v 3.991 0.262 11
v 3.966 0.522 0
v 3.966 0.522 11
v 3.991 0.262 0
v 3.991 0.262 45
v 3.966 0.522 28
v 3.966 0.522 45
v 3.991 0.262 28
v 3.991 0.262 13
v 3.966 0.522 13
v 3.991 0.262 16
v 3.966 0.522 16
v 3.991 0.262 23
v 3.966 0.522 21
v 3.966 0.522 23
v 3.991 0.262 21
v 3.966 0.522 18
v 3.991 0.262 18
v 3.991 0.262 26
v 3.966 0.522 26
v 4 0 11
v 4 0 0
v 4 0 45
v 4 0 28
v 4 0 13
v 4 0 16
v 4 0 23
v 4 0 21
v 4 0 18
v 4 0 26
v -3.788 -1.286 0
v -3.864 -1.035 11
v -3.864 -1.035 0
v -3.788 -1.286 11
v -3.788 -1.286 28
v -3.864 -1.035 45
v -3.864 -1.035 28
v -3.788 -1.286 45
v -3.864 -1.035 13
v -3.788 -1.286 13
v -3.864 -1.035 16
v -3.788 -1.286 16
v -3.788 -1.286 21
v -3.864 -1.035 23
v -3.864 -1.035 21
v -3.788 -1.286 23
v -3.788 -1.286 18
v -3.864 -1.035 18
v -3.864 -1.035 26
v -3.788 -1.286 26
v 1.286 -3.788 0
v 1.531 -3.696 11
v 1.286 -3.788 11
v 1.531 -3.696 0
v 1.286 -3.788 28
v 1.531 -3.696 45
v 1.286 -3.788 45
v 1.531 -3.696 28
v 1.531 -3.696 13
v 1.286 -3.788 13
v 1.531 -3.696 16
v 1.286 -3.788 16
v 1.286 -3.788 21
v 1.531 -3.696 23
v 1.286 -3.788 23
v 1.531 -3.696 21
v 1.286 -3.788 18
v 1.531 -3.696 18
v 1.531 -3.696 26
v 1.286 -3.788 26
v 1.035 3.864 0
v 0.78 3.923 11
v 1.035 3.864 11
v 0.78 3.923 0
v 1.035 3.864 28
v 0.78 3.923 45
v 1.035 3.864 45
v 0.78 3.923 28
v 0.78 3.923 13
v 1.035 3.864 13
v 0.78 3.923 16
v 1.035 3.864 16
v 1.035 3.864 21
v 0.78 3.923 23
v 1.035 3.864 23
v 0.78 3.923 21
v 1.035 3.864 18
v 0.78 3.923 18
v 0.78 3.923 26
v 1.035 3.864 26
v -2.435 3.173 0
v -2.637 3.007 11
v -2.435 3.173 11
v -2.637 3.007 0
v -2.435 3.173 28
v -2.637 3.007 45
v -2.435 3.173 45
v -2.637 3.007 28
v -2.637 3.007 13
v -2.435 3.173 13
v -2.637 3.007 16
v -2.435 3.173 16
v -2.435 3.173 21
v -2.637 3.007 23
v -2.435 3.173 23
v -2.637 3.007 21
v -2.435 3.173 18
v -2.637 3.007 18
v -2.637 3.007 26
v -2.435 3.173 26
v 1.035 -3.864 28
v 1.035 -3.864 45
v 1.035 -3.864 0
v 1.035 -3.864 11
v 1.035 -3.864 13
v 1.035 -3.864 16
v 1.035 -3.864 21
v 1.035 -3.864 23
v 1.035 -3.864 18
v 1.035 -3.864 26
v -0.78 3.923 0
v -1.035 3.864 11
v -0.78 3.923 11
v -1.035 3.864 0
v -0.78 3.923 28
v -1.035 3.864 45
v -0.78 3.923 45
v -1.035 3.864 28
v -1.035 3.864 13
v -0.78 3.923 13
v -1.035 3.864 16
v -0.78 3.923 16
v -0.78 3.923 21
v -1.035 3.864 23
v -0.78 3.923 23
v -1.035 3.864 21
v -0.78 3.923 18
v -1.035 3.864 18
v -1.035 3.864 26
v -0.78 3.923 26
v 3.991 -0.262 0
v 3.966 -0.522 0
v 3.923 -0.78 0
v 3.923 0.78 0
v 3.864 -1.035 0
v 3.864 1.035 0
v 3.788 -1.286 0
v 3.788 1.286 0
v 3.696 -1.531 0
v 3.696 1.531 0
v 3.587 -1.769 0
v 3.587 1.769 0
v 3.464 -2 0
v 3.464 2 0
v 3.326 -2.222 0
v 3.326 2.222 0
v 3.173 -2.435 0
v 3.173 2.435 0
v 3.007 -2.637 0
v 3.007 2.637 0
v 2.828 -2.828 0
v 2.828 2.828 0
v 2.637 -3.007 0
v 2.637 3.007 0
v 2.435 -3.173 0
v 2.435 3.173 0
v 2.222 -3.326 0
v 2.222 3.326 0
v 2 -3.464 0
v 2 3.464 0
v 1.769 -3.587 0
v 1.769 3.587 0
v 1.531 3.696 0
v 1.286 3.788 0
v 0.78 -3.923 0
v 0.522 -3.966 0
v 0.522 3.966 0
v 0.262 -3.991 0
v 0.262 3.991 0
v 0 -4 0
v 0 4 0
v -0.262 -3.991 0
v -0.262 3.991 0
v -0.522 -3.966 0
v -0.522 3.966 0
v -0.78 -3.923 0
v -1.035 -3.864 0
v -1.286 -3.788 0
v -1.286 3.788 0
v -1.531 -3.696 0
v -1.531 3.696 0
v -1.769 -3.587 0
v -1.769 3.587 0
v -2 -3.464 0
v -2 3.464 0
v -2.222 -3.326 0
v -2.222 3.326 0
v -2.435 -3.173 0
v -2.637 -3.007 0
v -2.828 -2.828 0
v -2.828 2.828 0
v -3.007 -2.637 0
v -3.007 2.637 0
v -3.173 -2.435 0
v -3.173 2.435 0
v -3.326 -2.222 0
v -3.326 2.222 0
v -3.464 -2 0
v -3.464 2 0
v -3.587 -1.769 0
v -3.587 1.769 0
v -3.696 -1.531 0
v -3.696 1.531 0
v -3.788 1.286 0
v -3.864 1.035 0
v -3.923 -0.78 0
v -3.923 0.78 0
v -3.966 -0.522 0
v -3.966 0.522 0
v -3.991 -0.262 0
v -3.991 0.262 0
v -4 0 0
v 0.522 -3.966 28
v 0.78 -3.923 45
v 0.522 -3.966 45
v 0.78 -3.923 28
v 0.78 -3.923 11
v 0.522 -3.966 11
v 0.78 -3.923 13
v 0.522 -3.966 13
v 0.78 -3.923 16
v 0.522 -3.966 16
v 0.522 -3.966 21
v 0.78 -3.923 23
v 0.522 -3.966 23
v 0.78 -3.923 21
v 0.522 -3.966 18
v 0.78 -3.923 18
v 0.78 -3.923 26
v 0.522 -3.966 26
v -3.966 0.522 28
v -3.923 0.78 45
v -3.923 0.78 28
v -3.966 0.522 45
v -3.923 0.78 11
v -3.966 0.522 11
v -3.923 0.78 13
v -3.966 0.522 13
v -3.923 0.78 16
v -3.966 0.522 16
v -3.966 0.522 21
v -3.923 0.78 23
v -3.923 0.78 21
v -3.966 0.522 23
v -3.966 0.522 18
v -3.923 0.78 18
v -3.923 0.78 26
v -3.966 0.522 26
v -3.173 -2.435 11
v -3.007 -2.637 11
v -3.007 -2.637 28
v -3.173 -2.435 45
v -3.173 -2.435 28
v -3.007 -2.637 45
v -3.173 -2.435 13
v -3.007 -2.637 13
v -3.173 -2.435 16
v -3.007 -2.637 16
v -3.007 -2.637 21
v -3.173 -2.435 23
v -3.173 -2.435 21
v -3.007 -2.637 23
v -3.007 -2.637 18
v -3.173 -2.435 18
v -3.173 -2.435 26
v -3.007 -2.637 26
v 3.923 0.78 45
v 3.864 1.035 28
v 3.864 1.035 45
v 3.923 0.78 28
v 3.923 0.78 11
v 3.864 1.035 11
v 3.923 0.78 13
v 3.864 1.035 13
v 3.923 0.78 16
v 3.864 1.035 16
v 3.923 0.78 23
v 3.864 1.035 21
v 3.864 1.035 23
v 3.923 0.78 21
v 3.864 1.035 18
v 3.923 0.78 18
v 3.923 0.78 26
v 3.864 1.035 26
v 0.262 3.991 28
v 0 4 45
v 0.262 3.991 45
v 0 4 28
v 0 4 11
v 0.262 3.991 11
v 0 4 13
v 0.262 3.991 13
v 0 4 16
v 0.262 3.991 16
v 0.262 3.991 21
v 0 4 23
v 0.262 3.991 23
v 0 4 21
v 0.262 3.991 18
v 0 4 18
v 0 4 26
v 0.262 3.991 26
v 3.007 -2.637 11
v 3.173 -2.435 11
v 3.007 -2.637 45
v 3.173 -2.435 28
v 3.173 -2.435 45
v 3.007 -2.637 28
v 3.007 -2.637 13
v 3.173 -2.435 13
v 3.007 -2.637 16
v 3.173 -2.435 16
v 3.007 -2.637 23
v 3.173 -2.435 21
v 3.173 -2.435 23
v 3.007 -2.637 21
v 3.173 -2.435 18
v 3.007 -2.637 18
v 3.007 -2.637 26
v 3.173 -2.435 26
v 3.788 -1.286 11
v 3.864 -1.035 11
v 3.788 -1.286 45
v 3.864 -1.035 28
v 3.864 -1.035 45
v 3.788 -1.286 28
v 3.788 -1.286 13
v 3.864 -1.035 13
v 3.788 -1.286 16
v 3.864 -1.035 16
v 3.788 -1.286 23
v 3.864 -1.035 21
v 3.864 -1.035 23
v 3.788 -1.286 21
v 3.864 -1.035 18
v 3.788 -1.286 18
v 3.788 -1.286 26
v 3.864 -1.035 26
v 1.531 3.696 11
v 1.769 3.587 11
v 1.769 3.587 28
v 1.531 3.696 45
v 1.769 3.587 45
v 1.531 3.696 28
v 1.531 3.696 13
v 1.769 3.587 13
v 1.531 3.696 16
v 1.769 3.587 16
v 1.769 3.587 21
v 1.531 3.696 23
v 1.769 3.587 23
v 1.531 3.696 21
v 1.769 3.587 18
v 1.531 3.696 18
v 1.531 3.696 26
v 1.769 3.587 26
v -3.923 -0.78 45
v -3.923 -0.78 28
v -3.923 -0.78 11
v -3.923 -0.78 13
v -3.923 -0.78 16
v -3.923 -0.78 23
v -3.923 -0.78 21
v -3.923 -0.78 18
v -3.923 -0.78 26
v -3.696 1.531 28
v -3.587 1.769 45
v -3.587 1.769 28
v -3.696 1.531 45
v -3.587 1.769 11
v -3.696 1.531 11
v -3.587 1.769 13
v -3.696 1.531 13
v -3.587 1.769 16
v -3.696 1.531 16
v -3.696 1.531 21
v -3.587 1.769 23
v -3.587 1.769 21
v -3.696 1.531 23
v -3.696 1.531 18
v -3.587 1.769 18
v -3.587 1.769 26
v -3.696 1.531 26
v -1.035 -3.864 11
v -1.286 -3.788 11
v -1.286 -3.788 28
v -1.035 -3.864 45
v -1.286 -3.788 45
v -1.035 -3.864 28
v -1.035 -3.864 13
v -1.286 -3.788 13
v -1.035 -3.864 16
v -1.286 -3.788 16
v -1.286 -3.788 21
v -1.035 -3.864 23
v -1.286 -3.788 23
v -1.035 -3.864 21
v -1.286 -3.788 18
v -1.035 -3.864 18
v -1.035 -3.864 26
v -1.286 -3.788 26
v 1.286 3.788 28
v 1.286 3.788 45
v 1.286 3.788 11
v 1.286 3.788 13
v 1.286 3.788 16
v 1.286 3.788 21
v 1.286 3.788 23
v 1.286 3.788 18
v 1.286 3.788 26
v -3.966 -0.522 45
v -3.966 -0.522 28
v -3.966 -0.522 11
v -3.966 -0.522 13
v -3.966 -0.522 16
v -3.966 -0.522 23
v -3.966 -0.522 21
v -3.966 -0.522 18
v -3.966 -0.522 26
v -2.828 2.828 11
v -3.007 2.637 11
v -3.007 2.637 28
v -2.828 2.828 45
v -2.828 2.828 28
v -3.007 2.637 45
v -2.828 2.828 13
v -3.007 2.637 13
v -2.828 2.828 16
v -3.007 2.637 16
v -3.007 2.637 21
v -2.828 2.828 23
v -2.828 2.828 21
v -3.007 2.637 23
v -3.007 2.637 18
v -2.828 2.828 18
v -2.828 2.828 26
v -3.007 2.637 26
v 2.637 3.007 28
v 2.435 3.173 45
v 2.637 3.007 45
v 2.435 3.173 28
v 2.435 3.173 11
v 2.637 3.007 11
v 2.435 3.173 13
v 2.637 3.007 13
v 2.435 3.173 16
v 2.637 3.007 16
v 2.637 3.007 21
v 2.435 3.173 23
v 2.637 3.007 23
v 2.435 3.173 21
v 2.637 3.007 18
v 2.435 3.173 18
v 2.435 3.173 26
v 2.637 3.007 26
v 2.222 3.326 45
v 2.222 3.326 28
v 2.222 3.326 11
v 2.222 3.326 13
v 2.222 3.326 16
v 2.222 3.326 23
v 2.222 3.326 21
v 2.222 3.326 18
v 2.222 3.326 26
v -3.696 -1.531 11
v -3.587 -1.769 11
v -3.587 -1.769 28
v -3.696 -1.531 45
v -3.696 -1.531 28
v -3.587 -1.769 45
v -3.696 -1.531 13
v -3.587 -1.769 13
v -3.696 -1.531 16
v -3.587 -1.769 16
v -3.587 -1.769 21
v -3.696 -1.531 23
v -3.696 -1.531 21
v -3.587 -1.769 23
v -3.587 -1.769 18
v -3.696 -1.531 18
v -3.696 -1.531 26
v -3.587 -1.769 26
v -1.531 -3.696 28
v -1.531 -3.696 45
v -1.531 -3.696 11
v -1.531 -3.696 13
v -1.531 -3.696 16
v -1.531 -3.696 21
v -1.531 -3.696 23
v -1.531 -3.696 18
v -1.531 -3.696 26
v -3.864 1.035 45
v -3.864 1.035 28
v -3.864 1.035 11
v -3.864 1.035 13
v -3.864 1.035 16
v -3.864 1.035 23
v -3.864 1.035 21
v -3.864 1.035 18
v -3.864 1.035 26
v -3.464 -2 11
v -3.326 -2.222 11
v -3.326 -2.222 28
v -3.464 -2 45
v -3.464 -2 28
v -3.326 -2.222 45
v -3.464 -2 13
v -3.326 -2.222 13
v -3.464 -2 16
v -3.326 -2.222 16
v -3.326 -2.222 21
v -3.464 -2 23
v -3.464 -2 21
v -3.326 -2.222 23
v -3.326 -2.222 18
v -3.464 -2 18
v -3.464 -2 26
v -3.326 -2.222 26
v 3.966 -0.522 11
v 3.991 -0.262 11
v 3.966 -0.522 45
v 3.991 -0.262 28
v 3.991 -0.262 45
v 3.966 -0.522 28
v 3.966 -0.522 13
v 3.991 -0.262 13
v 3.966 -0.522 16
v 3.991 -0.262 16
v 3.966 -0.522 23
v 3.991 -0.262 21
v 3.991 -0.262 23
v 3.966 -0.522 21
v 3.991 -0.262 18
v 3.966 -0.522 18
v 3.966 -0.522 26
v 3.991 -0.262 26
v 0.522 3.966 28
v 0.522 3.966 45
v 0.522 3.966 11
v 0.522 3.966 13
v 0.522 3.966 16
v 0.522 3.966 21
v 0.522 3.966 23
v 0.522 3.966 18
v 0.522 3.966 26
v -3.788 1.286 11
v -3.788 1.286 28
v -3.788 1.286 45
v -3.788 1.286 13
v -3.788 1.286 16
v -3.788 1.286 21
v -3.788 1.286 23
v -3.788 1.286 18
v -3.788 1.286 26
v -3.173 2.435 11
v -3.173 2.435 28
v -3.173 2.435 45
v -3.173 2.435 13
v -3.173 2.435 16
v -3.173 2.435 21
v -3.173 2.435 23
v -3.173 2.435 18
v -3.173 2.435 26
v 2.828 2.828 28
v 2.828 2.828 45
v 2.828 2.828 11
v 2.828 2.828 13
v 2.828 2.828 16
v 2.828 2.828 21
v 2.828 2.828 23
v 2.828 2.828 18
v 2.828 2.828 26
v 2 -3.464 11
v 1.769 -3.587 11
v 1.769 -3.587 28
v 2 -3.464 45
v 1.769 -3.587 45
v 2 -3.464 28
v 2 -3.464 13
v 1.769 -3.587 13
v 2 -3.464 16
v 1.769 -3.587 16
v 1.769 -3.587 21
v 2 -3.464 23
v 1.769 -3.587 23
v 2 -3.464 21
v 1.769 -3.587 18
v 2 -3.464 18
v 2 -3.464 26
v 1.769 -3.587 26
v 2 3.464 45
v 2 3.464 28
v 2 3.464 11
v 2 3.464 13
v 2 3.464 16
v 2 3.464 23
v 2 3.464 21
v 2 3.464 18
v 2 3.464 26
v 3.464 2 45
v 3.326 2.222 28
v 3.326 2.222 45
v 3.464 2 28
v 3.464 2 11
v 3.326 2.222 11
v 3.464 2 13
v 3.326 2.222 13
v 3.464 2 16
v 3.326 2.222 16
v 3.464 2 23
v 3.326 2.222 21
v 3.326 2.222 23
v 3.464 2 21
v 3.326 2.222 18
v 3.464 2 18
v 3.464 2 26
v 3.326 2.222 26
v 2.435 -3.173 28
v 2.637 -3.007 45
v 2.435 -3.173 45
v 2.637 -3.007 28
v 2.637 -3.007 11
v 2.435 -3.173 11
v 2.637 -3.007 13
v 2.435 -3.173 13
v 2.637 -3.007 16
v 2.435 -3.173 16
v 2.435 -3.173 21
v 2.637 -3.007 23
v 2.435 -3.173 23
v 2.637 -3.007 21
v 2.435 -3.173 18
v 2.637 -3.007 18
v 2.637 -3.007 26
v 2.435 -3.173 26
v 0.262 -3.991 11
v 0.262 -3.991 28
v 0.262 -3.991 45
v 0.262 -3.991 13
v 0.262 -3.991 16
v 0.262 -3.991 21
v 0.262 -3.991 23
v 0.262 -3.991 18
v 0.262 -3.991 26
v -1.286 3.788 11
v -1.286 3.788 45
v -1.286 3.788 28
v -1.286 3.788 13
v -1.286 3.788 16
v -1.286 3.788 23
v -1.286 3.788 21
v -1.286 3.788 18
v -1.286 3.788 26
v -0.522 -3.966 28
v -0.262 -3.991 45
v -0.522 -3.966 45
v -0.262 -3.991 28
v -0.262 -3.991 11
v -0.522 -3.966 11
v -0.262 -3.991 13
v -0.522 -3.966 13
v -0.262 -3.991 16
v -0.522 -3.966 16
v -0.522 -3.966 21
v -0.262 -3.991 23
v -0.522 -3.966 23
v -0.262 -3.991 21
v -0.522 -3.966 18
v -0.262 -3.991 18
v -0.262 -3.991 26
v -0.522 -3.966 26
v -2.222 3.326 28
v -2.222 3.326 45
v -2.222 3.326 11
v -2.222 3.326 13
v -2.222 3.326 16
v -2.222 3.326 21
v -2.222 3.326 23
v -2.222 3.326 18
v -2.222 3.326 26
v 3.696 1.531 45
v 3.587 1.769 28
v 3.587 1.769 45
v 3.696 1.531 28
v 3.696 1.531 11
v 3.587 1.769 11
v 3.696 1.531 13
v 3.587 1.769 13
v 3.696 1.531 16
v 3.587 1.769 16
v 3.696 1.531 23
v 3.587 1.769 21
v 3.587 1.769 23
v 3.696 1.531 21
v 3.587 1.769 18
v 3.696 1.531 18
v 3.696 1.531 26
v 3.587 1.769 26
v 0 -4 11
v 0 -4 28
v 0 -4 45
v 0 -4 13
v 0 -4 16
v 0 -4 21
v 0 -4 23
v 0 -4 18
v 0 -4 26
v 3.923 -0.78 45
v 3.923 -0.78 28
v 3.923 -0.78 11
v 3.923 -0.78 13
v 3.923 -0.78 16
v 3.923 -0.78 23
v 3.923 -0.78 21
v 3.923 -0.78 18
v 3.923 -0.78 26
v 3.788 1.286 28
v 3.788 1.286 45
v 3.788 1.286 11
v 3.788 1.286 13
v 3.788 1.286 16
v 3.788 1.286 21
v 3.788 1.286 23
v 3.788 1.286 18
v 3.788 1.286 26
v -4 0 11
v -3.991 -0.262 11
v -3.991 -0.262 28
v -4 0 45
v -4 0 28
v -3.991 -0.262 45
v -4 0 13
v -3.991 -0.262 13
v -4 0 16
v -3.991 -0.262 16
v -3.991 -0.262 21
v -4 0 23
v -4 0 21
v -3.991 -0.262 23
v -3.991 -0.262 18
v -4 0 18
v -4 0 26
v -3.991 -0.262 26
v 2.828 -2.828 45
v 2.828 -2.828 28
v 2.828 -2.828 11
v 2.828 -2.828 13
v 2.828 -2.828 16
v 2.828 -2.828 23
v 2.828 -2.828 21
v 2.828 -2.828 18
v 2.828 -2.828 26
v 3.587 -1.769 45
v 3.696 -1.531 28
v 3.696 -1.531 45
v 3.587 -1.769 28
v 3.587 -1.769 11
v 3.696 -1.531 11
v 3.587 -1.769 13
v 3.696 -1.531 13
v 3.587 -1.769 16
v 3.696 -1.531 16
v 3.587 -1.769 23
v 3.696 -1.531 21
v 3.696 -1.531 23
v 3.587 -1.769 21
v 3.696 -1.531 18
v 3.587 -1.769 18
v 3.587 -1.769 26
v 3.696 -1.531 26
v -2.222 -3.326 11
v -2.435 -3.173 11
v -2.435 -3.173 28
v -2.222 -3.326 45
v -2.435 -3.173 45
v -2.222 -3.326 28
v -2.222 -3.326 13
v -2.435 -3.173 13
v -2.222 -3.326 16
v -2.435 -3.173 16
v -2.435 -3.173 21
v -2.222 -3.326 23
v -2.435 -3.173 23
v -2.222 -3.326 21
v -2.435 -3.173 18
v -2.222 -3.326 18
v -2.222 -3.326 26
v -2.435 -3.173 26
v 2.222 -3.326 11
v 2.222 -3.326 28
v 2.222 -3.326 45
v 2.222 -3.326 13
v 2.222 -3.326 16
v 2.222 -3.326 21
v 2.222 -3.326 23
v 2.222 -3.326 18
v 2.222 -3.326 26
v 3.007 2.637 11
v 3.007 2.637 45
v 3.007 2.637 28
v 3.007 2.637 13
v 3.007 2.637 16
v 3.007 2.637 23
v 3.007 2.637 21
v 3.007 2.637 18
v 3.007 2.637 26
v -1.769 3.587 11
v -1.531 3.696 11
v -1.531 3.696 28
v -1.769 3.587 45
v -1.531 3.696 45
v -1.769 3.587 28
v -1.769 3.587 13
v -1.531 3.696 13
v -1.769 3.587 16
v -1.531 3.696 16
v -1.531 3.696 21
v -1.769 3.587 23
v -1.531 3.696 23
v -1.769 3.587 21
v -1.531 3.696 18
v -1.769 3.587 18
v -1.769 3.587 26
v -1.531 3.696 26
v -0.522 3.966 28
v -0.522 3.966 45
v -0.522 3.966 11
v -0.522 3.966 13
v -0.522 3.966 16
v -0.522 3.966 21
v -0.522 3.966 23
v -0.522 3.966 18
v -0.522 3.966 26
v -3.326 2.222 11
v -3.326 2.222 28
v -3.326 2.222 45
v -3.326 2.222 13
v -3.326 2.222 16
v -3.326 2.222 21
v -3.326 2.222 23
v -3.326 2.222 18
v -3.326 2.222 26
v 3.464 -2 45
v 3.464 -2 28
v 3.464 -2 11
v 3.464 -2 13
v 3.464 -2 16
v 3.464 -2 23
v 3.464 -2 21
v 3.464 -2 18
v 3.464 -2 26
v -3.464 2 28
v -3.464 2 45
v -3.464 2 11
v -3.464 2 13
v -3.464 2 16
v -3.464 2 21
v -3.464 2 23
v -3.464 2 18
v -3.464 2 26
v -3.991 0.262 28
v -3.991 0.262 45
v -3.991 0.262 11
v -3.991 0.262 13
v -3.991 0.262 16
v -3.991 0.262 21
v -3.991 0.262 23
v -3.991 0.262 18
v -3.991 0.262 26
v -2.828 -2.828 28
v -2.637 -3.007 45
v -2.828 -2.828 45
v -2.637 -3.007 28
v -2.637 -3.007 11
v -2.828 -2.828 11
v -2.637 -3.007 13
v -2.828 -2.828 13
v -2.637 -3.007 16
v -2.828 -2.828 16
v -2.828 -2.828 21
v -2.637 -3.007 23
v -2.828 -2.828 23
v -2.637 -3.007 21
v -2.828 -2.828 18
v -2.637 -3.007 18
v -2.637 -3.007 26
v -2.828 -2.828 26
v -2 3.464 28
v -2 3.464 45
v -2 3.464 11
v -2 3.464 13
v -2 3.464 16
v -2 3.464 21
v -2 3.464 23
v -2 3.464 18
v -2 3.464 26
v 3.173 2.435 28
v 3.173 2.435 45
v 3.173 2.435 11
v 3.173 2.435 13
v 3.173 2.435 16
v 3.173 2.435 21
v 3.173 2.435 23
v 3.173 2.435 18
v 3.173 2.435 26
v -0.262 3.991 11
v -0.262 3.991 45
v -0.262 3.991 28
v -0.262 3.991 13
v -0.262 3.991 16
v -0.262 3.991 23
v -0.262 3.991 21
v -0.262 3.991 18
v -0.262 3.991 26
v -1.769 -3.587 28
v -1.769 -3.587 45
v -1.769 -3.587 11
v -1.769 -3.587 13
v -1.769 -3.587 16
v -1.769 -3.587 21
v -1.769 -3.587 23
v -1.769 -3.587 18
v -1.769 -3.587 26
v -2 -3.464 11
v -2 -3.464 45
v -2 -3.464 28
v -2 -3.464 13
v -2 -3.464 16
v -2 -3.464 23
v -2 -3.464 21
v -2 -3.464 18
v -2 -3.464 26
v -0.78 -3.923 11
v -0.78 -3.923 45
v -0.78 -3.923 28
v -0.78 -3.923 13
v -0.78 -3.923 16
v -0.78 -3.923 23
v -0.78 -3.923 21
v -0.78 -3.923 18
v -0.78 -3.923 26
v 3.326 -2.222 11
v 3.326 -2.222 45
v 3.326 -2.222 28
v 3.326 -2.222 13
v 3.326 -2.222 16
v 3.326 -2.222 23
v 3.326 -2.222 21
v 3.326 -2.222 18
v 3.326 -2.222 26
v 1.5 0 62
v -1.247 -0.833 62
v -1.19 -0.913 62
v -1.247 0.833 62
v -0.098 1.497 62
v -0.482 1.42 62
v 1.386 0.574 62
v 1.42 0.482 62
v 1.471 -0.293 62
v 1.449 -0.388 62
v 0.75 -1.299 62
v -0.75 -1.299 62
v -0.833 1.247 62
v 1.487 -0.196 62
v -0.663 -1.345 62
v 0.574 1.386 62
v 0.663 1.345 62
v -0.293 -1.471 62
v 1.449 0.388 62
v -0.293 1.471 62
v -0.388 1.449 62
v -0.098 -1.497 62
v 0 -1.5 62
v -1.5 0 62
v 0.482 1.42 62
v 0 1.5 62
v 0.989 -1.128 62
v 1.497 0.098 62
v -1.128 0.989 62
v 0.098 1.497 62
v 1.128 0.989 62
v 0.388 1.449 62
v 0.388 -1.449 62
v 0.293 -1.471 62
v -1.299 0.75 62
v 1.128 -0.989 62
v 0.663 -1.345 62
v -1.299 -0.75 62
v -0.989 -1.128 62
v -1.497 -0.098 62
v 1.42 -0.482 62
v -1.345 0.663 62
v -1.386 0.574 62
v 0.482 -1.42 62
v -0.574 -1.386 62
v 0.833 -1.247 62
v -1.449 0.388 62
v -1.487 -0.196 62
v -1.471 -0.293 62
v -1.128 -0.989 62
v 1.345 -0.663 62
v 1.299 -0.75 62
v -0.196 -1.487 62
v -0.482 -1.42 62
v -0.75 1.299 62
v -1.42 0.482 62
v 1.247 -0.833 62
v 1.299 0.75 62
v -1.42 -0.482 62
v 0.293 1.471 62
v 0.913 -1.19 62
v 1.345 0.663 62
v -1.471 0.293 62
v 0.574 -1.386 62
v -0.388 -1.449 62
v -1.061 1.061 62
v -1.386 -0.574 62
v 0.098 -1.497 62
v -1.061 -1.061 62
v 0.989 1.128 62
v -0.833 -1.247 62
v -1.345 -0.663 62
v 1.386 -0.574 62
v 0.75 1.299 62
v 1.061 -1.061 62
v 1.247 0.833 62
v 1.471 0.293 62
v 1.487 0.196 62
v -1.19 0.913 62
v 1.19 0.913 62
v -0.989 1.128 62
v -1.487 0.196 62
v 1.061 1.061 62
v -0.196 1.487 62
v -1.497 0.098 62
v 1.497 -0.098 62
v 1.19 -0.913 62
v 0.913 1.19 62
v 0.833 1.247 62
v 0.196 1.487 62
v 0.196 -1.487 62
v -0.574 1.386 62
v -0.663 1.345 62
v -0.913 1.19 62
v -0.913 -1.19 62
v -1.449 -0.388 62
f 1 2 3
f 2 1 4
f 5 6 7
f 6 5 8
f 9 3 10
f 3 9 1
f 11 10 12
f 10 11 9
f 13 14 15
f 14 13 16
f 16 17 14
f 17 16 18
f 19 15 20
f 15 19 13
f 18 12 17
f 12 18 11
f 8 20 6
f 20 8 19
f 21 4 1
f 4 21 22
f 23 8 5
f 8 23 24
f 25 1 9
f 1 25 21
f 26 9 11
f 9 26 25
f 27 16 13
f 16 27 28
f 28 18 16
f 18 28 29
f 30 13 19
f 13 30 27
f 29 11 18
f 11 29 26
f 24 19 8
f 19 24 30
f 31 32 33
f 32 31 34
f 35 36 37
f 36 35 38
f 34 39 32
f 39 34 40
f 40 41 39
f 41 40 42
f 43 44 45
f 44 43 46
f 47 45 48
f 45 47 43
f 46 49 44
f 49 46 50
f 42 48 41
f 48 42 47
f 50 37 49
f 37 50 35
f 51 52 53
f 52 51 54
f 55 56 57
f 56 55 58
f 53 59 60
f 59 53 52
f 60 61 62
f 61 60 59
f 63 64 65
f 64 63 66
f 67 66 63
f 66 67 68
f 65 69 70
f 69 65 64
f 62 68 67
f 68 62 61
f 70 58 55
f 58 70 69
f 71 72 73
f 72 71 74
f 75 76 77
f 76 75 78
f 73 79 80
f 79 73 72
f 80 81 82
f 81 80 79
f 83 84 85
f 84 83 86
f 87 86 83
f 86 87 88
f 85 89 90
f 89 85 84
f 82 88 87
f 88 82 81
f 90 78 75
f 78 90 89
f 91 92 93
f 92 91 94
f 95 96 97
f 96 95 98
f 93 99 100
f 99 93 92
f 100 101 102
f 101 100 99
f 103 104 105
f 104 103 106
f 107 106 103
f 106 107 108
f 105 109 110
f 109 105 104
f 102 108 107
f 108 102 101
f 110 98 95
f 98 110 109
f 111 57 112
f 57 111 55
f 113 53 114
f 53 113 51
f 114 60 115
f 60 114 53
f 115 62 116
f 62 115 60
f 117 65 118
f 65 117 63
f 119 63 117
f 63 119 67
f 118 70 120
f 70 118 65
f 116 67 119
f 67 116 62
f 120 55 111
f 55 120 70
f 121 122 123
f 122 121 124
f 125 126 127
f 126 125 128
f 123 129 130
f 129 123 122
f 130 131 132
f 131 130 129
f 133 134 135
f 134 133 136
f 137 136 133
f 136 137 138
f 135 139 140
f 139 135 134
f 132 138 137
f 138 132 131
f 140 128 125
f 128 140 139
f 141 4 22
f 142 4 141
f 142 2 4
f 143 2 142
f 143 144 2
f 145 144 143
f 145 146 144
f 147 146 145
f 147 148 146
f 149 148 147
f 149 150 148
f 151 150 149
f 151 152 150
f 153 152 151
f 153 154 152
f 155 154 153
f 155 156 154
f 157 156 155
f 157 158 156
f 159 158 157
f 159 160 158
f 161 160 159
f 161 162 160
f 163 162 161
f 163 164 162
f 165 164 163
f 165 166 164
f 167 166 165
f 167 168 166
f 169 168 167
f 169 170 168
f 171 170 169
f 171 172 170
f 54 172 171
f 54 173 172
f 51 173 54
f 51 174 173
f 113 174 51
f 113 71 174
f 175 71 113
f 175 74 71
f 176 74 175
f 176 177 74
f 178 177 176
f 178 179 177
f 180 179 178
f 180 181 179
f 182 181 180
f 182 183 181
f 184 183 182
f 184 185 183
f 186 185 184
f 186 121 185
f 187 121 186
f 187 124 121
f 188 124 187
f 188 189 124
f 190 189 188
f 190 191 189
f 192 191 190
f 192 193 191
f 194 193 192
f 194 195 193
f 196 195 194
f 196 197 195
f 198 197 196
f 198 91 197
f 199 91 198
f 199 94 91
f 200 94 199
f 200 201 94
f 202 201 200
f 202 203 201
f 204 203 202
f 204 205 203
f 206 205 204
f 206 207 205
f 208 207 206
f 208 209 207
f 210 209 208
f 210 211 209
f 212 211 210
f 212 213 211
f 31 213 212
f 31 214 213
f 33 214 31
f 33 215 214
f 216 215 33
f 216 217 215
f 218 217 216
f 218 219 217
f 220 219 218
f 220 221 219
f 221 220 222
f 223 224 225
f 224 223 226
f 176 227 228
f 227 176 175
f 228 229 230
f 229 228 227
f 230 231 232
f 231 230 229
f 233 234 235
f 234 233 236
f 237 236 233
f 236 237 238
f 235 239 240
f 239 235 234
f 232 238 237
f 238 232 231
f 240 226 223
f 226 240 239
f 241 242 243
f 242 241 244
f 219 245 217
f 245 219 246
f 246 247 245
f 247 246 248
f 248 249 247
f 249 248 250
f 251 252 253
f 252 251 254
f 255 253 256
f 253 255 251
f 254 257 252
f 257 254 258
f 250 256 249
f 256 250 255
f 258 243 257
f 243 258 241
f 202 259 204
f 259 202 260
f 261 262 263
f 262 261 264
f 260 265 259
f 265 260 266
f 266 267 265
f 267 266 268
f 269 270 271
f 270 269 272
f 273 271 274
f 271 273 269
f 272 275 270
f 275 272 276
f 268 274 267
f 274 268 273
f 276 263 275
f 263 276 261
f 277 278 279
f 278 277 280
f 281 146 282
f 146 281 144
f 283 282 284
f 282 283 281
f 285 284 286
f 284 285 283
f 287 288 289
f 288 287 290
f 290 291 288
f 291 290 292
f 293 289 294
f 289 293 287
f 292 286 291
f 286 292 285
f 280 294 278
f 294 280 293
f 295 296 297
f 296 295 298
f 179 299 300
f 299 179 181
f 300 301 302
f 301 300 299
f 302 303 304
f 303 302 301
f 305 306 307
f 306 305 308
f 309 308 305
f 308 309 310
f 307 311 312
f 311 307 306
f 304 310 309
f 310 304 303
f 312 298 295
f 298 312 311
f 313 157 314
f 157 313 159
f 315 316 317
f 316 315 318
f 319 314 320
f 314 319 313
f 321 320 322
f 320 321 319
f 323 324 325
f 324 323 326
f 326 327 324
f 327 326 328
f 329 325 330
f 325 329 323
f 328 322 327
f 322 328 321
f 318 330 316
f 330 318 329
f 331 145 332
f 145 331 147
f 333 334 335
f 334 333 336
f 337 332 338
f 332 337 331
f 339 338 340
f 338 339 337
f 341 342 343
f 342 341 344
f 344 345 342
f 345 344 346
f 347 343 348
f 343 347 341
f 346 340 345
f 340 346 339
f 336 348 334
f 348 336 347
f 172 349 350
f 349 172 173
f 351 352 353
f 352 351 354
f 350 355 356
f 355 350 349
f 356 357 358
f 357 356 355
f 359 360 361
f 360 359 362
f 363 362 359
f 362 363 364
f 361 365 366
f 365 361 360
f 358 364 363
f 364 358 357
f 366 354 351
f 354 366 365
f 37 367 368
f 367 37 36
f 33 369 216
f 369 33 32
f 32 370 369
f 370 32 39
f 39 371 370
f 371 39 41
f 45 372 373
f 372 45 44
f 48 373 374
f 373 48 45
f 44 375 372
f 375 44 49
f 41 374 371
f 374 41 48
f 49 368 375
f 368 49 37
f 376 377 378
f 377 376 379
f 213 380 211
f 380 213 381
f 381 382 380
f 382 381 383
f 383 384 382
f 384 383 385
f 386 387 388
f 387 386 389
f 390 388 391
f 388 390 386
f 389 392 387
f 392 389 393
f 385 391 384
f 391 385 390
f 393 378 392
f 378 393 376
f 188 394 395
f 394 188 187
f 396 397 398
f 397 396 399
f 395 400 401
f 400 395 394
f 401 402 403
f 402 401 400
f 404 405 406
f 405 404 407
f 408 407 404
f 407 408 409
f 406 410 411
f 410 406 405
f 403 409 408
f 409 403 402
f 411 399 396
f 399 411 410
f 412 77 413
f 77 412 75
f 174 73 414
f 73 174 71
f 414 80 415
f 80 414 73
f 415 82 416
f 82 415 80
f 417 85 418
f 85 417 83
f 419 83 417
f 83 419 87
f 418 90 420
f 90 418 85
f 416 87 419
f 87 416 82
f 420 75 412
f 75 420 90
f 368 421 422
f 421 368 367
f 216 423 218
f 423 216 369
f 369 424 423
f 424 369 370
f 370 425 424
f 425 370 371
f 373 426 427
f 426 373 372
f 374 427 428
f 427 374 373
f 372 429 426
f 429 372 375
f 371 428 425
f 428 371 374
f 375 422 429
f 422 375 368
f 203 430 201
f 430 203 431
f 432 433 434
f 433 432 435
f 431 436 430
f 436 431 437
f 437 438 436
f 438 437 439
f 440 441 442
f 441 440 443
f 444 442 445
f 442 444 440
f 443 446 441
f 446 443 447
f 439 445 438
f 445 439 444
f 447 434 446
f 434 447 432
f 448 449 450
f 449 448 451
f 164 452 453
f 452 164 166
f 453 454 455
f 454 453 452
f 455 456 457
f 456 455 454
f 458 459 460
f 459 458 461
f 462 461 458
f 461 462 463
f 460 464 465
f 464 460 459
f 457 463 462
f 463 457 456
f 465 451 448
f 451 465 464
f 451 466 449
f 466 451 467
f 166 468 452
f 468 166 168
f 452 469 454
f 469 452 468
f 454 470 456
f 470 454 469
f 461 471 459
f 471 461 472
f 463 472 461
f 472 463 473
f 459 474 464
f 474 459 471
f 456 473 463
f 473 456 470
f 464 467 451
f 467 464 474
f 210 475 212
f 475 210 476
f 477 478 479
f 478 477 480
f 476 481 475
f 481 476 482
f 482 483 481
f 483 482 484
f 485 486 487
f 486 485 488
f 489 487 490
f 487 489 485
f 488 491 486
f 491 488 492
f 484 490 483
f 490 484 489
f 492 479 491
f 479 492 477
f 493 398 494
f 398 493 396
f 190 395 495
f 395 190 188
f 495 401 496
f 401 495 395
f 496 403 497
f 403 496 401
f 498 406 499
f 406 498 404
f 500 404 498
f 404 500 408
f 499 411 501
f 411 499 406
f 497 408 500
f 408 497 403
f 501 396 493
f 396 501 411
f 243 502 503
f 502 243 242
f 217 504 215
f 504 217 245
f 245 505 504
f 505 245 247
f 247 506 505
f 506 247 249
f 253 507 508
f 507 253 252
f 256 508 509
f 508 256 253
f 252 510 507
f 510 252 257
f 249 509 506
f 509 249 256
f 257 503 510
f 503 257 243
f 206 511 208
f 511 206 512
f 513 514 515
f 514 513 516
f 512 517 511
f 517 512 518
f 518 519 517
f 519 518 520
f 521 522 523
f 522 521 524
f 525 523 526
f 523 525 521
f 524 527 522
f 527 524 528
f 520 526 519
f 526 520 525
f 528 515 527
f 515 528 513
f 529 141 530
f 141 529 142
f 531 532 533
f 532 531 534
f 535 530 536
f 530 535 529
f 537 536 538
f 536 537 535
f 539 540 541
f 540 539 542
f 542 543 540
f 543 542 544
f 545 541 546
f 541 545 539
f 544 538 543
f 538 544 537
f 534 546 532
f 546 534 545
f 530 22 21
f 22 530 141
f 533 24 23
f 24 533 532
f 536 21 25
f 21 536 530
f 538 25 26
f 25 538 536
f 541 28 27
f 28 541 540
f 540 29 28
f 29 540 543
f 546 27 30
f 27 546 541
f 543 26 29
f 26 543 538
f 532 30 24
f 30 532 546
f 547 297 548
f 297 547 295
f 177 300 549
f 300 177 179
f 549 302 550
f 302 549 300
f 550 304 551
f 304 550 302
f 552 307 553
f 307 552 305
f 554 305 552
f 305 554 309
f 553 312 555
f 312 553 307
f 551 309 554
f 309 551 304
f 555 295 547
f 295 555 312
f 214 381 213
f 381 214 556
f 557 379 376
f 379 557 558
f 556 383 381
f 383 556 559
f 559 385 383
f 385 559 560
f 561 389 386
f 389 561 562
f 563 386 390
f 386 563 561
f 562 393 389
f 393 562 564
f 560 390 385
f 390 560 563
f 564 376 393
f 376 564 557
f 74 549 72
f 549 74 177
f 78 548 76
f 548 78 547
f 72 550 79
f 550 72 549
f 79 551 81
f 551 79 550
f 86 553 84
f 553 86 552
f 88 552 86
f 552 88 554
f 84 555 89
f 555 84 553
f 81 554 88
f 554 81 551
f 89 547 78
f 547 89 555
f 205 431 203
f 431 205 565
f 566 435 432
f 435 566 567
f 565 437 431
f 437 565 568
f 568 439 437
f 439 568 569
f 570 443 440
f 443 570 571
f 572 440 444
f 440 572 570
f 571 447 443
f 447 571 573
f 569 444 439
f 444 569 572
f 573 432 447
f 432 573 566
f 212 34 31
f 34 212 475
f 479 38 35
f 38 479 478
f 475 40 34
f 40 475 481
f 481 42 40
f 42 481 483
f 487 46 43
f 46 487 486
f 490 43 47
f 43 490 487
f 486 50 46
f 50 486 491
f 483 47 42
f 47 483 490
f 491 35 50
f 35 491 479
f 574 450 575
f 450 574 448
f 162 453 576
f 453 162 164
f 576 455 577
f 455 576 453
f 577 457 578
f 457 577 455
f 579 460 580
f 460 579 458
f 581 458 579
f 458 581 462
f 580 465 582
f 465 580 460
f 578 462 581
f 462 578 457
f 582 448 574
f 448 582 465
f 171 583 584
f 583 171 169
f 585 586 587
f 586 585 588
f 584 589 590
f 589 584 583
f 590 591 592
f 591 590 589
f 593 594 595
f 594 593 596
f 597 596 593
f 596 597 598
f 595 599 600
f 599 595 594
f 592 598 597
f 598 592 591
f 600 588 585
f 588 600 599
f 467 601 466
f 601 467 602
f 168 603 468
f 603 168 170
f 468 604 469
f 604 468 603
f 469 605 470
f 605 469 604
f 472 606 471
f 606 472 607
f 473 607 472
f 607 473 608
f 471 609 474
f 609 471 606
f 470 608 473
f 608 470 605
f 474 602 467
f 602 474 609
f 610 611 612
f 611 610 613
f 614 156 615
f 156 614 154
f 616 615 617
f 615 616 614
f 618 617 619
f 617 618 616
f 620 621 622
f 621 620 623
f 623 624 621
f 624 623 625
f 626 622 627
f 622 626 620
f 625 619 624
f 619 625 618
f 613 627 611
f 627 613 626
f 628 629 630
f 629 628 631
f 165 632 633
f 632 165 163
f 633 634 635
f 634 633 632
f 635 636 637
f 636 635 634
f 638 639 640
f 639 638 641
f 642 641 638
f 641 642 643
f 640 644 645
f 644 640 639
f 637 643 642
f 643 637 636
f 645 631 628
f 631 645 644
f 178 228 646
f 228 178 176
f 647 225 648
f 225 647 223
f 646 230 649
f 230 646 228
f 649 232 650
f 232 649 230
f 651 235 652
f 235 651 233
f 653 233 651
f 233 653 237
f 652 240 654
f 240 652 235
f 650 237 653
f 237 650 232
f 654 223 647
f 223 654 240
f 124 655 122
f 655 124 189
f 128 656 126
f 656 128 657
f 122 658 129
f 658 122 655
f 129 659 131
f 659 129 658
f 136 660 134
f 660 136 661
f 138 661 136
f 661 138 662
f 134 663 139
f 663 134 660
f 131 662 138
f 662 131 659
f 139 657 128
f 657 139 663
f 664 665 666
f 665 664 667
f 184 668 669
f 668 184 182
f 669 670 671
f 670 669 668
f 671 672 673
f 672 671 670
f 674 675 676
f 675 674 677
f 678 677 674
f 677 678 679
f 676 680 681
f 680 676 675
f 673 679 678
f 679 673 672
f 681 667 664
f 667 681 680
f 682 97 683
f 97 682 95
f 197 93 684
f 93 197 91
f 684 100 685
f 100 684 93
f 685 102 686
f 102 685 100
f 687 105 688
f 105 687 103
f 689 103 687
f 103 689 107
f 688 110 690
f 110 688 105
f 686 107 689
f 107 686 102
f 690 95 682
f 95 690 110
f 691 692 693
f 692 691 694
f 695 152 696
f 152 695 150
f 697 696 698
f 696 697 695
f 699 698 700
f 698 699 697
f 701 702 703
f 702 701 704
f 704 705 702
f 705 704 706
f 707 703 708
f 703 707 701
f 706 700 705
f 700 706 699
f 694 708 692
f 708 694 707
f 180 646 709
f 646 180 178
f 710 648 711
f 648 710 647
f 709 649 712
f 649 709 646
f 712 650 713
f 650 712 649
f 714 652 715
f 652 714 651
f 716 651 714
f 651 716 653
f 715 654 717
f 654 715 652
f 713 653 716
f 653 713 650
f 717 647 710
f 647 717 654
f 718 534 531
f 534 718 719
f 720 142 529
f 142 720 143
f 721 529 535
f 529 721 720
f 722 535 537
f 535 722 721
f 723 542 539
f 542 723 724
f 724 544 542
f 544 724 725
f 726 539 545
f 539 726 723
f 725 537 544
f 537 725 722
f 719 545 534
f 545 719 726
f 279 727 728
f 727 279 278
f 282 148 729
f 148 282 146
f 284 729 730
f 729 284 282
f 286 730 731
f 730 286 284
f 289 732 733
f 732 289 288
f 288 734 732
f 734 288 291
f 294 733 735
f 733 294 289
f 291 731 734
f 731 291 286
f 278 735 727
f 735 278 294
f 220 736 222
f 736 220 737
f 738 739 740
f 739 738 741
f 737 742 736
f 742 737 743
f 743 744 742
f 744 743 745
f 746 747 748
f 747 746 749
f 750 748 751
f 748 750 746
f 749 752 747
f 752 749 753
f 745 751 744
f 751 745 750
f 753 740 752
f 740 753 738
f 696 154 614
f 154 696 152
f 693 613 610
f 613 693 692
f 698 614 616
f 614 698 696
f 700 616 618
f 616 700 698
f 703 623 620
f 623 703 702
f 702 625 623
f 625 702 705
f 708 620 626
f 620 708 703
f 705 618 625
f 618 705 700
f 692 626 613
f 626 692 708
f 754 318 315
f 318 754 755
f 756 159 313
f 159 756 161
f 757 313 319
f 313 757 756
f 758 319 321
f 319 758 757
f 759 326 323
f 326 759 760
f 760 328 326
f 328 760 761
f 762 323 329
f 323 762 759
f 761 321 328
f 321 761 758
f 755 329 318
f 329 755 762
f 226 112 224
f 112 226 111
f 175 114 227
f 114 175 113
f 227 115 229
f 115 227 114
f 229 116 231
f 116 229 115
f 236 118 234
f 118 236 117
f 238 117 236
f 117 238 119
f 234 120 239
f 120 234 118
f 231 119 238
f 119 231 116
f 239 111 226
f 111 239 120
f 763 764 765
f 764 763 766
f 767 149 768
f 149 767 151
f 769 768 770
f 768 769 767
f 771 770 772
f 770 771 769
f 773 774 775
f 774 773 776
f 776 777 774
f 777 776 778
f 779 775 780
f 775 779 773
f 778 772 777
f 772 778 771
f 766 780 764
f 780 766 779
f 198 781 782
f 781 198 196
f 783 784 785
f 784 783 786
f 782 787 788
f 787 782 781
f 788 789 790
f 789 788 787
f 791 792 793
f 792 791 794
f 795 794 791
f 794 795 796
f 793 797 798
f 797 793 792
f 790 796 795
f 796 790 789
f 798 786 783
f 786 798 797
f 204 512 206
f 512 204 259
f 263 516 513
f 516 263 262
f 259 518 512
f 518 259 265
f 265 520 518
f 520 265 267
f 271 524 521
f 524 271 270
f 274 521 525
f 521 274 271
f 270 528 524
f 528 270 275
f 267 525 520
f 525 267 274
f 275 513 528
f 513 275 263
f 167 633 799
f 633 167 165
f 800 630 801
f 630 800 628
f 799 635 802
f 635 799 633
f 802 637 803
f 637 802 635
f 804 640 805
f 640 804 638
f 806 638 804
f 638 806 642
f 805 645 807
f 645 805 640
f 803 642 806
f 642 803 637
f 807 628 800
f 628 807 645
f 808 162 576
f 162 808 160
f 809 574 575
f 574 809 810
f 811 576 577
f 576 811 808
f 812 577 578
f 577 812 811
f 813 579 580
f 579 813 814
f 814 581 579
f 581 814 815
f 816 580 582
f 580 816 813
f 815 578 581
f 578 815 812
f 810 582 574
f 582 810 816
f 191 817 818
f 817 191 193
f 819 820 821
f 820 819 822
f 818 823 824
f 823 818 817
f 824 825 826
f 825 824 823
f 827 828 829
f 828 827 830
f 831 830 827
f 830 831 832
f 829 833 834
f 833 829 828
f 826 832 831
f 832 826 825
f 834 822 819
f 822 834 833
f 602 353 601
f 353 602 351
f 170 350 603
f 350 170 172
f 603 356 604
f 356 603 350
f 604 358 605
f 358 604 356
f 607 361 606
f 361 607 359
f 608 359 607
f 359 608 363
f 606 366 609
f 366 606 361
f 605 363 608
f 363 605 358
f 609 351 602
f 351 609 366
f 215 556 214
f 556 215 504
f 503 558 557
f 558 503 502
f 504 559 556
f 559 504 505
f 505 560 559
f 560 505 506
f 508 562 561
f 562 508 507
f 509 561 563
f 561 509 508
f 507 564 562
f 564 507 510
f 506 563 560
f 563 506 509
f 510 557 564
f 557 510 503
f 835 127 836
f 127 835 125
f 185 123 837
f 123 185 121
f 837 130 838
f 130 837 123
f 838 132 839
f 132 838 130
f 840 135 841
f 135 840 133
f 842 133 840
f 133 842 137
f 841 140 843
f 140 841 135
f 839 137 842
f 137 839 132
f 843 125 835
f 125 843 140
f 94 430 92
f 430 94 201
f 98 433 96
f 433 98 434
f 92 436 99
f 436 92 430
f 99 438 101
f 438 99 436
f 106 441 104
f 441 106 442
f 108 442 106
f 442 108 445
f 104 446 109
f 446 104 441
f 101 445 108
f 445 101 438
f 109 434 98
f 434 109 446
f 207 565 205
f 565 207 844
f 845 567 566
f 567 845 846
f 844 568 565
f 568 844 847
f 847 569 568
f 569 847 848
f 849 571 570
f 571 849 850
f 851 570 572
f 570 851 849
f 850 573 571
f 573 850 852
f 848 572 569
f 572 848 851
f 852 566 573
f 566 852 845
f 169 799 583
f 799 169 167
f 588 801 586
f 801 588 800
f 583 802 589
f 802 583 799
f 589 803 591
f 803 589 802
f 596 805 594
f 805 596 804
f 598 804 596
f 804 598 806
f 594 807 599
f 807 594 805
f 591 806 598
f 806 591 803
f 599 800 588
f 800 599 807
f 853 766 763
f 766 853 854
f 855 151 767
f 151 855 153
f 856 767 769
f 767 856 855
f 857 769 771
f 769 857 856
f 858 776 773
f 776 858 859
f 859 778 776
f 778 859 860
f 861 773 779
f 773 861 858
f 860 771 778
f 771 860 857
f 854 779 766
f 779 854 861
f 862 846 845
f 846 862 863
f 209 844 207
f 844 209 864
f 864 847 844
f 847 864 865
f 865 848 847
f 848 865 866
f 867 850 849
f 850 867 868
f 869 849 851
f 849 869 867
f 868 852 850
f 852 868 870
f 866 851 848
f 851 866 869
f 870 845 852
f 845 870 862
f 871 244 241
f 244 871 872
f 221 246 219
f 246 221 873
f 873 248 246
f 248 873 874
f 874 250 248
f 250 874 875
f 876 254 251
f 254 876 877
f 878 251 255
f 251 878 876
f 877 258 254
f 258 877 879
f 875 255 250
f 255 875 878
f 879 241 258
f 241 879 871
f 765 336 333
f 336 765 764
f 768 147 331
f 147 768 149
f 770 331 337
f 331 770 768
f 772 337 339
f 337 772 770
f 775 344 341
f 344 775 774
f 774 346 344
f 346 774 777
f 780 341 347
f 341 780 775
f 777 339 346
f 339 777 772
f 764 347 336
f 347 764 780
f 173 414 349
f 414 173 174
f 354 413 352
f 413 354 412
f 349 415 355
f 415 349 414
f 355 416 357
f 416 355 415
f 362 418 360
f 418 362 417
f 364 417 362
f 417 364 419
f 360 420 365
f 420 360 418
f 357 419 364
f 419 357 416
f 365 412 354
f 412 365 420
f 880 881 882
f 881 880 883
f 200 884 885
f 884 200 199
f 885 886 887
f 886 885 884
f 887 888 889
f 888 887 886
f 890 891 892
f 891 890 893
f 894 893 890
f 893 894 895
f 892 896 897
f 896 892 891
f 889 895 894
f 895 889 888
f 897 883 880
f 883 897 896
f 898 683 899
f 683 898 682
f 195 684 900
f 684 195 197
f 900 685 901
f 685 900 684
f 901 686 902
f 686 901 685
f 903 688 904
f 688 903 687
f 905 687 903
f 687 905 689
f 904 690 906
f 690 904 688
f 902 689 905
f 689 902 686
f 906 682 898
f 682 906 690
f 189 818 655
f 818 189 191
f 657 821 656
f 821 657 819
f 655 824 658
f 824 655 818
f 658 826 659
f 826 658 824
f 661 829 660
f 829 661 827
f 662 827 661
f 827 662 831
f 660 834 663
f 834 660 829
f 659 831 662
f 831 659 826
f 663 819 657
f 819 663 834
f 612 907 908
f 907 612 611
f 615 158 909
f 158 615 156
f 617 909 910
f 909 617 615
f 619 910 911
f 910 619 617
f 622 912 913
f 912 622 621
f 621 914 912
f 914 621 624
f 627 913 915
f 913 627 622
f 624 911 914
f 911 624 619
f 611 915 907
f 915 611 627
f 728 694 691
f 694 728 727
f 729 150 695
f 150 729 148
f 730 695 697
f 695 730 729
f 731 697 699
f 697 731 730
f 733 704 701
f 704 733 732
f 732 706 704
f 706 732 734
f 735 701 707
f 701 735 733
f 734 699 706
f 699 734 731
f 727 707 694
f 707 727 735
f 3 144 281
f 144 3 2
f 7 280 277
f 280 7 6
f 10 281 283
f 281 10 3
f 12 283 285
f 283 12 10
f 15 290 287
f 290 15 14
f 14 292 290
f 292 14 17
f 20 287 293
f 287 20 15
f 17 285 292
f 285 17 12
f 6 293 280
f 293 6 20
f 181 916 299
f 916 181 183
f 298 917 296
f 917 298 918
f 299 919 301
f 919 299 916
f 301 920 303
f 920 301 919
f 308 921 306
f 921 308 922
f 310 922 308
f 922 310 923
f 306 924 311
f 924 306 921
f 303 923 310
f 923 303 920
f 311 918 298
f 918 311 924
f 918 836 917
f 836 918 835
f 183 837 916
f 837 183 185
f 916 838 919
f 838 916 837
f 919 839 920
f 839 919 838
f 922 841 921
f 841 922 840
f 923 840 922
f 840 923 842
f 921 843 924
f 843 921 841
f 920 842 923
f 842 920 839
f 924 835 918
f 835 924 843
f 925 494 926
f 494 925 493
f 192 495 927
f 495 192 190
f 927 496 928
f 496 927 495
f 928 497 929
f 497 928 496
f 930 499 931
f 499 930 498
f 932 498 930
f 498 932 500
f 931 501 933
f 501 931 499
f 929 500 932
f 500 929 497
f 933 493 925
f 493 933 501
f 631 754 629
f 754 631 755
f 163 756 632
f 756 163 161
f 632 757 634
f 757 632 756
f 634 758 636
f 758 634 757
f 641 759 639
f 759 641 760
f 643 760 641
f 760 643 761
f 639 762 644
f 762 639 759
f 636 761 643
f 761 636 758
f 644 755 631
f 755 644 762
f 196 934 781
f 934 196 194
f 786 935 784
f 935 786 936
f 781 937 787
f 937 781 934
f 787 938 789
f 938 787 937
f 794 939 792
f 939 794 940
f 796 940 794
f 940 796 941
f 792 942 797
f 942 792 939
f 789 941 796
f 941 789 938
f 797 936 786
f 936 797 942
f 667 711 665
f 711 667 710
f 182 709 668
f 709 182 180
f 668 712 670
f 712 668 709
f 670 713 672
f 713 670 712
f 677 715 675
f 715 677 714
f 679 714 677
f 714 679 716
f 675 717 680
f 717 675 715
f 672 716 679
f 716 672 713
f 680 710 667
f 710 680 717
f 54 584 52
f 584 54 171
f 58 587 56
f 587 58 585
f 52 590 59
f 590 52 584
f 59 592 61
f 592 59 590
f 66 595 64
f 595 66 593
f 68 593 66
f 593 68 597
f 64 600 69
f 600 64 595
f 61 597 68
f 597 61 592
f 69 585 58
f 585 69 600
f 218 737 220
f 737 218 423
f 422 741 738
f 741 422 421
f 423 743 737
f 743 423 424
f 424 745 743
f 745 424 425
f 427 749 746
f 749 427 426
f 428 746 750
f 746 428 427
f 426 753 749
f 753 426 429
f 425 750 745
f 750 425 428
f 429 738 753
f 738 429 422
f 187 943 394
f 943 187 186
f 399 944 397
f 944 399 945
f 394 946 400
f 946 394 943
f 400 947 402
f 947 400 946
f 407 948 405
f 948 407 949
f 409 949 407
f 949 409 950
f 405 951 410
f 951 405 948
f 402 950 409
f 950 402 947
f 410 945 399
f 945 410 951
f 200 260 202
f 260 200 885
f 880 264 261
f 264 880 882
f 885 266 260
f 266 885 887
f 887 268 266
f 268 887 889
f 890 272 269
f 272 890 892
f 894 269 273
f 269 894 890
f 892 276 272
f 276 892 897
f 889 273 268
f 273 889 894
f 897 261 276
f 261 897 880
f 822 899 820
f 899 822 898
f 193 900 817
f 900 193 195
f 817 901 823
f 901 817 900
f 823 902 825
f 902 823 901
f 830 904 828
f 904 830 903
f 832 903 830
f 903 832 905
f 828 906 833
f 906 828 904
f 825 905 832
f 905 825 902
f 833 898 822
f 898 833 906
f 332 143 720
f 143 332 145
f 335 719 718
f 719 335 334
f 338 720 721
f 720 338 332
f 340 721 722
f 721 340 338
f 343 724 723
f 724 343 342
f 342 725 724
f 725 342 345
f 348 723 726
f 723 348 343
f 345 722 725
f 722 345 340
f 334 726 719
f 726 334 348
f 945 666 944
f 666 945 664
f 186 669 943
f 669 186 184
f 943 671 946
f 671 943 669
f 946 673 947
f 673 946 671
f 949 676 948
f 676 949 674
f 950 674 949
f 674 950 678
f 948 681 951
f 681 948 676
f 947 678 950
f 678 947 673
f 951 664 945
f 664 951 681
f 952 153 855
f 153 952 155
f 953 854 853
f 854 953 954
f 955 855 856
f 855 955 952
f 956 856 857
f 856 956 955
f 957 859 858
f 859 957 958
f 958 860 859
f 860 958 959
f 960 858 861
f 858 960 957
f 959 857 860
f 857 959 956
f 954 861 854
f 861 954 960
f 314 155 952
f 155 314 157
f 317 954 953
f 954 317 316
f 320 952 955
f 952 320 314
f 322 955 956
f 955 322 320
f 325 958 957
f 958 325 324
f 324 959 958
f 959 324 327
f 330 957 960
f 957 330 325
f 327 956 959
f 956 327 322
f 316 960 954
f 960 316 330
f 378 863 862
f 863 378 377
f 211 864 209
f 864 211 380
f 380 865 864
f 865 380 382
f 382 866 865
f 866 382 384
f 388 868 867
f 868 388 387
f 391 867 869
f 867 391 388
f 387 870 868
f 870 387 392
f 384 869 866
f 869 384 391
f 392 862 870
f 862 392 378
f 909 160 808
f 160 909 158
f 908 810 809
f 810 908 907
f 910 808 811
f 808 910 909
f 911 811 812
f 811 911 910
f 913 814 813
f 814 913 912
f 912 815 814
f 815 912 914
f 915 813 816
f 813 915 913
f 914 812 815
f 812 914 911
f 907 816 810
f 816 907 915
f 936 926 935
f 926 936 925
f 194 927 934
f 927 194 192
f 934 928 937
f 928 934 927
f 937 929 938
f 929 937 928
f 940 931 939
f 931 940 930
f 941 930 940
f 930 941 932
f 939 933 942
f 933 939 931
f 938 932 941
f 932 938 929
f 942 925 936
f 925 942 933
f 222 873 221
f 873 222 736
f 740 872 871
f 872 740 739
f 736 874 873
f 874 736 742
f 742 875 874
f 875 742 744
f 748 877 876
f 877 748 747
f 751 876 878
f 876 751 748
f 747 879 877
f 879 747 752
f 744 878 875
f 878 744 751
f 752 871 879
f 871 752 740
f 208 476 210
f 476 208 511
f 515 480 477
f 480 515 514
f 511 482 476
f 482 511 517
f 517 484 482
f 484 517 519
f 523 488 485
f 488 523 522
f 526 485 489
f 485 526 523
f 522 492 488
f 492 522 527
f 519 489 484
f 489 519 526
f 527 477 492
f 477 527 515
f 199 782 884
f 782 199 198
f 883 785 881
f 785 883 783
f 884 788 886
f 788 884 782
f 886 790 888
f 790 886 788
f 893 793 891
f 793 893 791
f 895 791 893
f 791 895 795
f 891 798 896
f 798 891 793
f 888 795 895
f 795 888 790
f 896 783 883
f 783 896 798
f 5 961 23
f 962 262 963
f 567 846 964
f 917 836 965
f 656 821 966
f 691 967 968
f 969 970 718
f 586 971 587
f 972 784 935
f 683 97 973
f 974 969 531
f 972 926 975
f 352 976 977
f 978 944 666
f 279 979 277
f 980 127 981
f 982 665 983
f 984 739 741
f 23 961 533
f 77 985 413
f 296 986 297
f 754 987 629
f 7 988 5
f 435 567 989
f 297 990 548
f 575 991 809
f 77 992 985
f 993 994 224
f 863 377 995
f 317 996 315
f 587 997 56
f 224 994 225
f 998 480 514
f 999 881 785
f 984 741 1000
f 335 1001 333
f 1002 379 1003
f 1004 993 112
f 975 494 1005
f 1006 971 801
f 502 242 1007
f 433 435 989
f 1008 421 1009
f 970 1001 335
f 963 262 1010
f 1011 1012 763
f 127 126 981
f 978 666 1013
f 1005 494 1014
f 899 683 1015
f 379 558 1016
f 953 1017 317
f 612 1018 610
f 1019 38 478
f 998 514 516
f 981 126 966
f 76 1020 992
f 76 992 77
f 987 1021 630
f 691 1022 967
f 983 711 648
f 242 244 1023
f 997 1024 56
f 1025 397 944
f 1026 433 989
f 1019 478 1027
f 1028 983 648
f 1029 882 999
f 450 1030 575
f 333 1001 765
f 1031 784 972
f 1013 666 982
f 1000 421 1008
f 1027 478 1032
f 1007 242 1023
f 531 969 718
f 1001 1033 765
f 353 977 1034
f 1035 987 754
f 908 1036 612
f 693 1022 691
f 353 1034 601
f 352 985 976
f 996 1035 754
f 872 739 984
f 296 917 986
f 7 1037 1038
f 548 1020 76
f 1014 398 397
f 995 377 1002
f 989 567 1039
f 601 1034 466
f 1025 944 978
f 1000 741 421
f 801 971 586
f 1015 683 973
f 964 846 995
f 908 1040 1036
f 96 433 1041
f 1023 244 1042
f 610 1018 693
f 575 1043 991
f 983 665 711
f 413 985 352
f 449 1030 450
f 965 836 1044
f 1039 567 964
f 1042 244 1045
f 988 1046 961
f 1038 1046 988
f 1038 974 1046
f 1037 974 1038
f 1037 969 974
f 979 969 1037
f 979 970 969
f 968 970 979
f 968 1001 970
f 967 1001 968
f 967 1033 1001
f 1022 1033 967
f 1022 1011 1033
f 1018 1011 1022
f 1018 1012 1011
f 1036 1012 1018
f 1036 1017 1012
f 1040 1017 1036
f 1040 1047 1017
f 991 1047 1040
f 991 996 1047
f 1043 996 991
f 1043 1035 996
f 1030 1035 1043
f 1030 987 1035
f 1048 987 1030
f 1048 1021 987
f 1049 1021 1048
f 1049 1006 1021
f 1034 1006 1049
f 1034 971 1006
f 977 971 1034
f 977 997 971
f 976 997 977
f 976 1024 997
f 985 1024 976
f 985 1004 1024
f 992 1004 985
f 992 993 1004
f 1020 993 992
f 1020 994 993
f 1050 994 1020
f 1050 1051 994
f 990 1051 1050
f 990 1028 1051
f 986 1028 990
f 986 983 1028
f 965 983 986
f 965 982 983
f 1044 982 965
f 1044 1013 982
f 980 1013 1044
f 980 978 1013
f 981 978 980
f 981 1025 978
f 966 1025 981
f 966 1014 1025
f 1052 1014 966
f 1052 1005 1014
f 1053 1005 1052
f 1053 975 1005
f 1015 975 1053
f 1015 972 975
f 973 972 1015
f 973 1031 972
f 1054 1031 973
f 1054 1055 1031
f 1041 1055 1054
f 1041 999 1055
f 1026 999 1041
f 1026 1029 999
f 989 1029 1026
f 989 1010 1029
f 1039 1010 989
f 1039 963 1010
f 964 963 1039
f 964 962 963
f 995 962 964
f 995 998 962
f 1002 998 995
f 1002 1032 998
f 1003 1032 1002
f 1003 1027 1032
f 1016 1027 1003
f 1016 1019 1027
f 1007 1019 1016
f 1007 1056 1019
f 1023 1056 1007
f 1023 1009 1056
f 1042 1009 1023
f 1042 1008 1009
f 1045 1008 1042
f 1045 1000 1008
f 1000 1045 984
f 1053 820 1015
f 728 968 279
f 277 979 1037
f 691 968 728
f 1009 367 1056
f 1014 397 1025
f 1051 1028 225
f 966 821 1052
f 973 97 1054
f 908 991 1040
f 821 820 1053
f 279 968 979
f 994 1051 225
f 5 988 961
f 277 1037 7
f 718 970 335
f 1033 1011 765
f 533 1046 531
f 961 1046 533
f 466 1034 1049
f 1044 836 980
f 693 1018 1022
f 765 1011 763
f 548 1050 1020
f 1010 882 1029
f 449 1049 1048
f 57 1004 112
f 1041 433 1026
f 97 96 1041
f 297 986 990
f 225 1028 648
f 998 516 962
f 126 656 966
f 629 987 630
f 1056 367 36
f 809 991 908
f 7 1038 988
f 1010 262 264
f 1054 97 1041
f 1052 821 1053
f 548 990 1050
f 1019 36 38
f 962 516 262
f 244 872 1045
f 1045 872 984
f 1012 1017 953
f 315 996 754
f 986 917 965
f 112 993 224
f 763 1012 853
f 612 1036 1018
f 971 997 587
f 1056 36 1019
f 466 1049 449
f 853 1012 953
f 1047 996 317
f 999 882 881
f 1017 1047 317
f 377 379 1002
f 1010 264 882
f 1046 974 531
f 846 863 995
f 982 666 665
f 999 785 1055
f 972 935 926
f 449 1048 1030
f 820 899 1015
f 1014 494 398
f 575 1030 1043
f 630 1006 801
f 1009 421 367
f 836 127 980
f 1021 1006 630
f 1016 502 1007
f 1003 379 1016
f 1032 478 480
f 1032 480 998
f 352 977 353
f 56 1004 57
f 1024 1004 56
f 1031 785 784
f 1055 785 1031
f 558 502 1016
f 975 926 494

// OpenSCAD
// Pestle for grinding tissue in a 1.5 mL microcentrifuge tube
// Printed upright: handle at the bottom, tip pointing up.

$fn = 96;

// ---- Dimensions (mm) ----
handle_d      = 8;    // handle diameter
handle_top_z  = 45;   // handle height / cone start
tip_min_d     = 3;    // cone tip diameter / sphere diameter
tip_centre_z  = 62;   // sphere centre height
groove_count  = 4;    // number of circumferential grooves
groove_w      = 2;    // groove width (Z)
groove_d      = 1;    // groove depth from outer surface
groove_zs     = [10, 15, 20, 25]; // groove centre heights

eps           = 0.5;  // cutter overshoot

difference() {
    union() {
        // Handle
        cylinder(d = handle_d, h = handle_top_z);
        // Cone
        translate([0, 0, handle_top_z])
            cylinder(d1 = handle_d, d2 = tip_min_d, h = tip_centre_z - handle_top_z);
        // Rounded tip
        translate([0, 0, tip_centre_z - 1.5])
            sphere(d = tip_min_d);
    }

    // Grip grooves
    for (z = groove_zs)
        translate([0, 0, z - groove_w / 2])
            rotate_extrude()
                translate([handle_d / 2, groove_w, 0])
                    square([groove_d, groove_w]);
}
